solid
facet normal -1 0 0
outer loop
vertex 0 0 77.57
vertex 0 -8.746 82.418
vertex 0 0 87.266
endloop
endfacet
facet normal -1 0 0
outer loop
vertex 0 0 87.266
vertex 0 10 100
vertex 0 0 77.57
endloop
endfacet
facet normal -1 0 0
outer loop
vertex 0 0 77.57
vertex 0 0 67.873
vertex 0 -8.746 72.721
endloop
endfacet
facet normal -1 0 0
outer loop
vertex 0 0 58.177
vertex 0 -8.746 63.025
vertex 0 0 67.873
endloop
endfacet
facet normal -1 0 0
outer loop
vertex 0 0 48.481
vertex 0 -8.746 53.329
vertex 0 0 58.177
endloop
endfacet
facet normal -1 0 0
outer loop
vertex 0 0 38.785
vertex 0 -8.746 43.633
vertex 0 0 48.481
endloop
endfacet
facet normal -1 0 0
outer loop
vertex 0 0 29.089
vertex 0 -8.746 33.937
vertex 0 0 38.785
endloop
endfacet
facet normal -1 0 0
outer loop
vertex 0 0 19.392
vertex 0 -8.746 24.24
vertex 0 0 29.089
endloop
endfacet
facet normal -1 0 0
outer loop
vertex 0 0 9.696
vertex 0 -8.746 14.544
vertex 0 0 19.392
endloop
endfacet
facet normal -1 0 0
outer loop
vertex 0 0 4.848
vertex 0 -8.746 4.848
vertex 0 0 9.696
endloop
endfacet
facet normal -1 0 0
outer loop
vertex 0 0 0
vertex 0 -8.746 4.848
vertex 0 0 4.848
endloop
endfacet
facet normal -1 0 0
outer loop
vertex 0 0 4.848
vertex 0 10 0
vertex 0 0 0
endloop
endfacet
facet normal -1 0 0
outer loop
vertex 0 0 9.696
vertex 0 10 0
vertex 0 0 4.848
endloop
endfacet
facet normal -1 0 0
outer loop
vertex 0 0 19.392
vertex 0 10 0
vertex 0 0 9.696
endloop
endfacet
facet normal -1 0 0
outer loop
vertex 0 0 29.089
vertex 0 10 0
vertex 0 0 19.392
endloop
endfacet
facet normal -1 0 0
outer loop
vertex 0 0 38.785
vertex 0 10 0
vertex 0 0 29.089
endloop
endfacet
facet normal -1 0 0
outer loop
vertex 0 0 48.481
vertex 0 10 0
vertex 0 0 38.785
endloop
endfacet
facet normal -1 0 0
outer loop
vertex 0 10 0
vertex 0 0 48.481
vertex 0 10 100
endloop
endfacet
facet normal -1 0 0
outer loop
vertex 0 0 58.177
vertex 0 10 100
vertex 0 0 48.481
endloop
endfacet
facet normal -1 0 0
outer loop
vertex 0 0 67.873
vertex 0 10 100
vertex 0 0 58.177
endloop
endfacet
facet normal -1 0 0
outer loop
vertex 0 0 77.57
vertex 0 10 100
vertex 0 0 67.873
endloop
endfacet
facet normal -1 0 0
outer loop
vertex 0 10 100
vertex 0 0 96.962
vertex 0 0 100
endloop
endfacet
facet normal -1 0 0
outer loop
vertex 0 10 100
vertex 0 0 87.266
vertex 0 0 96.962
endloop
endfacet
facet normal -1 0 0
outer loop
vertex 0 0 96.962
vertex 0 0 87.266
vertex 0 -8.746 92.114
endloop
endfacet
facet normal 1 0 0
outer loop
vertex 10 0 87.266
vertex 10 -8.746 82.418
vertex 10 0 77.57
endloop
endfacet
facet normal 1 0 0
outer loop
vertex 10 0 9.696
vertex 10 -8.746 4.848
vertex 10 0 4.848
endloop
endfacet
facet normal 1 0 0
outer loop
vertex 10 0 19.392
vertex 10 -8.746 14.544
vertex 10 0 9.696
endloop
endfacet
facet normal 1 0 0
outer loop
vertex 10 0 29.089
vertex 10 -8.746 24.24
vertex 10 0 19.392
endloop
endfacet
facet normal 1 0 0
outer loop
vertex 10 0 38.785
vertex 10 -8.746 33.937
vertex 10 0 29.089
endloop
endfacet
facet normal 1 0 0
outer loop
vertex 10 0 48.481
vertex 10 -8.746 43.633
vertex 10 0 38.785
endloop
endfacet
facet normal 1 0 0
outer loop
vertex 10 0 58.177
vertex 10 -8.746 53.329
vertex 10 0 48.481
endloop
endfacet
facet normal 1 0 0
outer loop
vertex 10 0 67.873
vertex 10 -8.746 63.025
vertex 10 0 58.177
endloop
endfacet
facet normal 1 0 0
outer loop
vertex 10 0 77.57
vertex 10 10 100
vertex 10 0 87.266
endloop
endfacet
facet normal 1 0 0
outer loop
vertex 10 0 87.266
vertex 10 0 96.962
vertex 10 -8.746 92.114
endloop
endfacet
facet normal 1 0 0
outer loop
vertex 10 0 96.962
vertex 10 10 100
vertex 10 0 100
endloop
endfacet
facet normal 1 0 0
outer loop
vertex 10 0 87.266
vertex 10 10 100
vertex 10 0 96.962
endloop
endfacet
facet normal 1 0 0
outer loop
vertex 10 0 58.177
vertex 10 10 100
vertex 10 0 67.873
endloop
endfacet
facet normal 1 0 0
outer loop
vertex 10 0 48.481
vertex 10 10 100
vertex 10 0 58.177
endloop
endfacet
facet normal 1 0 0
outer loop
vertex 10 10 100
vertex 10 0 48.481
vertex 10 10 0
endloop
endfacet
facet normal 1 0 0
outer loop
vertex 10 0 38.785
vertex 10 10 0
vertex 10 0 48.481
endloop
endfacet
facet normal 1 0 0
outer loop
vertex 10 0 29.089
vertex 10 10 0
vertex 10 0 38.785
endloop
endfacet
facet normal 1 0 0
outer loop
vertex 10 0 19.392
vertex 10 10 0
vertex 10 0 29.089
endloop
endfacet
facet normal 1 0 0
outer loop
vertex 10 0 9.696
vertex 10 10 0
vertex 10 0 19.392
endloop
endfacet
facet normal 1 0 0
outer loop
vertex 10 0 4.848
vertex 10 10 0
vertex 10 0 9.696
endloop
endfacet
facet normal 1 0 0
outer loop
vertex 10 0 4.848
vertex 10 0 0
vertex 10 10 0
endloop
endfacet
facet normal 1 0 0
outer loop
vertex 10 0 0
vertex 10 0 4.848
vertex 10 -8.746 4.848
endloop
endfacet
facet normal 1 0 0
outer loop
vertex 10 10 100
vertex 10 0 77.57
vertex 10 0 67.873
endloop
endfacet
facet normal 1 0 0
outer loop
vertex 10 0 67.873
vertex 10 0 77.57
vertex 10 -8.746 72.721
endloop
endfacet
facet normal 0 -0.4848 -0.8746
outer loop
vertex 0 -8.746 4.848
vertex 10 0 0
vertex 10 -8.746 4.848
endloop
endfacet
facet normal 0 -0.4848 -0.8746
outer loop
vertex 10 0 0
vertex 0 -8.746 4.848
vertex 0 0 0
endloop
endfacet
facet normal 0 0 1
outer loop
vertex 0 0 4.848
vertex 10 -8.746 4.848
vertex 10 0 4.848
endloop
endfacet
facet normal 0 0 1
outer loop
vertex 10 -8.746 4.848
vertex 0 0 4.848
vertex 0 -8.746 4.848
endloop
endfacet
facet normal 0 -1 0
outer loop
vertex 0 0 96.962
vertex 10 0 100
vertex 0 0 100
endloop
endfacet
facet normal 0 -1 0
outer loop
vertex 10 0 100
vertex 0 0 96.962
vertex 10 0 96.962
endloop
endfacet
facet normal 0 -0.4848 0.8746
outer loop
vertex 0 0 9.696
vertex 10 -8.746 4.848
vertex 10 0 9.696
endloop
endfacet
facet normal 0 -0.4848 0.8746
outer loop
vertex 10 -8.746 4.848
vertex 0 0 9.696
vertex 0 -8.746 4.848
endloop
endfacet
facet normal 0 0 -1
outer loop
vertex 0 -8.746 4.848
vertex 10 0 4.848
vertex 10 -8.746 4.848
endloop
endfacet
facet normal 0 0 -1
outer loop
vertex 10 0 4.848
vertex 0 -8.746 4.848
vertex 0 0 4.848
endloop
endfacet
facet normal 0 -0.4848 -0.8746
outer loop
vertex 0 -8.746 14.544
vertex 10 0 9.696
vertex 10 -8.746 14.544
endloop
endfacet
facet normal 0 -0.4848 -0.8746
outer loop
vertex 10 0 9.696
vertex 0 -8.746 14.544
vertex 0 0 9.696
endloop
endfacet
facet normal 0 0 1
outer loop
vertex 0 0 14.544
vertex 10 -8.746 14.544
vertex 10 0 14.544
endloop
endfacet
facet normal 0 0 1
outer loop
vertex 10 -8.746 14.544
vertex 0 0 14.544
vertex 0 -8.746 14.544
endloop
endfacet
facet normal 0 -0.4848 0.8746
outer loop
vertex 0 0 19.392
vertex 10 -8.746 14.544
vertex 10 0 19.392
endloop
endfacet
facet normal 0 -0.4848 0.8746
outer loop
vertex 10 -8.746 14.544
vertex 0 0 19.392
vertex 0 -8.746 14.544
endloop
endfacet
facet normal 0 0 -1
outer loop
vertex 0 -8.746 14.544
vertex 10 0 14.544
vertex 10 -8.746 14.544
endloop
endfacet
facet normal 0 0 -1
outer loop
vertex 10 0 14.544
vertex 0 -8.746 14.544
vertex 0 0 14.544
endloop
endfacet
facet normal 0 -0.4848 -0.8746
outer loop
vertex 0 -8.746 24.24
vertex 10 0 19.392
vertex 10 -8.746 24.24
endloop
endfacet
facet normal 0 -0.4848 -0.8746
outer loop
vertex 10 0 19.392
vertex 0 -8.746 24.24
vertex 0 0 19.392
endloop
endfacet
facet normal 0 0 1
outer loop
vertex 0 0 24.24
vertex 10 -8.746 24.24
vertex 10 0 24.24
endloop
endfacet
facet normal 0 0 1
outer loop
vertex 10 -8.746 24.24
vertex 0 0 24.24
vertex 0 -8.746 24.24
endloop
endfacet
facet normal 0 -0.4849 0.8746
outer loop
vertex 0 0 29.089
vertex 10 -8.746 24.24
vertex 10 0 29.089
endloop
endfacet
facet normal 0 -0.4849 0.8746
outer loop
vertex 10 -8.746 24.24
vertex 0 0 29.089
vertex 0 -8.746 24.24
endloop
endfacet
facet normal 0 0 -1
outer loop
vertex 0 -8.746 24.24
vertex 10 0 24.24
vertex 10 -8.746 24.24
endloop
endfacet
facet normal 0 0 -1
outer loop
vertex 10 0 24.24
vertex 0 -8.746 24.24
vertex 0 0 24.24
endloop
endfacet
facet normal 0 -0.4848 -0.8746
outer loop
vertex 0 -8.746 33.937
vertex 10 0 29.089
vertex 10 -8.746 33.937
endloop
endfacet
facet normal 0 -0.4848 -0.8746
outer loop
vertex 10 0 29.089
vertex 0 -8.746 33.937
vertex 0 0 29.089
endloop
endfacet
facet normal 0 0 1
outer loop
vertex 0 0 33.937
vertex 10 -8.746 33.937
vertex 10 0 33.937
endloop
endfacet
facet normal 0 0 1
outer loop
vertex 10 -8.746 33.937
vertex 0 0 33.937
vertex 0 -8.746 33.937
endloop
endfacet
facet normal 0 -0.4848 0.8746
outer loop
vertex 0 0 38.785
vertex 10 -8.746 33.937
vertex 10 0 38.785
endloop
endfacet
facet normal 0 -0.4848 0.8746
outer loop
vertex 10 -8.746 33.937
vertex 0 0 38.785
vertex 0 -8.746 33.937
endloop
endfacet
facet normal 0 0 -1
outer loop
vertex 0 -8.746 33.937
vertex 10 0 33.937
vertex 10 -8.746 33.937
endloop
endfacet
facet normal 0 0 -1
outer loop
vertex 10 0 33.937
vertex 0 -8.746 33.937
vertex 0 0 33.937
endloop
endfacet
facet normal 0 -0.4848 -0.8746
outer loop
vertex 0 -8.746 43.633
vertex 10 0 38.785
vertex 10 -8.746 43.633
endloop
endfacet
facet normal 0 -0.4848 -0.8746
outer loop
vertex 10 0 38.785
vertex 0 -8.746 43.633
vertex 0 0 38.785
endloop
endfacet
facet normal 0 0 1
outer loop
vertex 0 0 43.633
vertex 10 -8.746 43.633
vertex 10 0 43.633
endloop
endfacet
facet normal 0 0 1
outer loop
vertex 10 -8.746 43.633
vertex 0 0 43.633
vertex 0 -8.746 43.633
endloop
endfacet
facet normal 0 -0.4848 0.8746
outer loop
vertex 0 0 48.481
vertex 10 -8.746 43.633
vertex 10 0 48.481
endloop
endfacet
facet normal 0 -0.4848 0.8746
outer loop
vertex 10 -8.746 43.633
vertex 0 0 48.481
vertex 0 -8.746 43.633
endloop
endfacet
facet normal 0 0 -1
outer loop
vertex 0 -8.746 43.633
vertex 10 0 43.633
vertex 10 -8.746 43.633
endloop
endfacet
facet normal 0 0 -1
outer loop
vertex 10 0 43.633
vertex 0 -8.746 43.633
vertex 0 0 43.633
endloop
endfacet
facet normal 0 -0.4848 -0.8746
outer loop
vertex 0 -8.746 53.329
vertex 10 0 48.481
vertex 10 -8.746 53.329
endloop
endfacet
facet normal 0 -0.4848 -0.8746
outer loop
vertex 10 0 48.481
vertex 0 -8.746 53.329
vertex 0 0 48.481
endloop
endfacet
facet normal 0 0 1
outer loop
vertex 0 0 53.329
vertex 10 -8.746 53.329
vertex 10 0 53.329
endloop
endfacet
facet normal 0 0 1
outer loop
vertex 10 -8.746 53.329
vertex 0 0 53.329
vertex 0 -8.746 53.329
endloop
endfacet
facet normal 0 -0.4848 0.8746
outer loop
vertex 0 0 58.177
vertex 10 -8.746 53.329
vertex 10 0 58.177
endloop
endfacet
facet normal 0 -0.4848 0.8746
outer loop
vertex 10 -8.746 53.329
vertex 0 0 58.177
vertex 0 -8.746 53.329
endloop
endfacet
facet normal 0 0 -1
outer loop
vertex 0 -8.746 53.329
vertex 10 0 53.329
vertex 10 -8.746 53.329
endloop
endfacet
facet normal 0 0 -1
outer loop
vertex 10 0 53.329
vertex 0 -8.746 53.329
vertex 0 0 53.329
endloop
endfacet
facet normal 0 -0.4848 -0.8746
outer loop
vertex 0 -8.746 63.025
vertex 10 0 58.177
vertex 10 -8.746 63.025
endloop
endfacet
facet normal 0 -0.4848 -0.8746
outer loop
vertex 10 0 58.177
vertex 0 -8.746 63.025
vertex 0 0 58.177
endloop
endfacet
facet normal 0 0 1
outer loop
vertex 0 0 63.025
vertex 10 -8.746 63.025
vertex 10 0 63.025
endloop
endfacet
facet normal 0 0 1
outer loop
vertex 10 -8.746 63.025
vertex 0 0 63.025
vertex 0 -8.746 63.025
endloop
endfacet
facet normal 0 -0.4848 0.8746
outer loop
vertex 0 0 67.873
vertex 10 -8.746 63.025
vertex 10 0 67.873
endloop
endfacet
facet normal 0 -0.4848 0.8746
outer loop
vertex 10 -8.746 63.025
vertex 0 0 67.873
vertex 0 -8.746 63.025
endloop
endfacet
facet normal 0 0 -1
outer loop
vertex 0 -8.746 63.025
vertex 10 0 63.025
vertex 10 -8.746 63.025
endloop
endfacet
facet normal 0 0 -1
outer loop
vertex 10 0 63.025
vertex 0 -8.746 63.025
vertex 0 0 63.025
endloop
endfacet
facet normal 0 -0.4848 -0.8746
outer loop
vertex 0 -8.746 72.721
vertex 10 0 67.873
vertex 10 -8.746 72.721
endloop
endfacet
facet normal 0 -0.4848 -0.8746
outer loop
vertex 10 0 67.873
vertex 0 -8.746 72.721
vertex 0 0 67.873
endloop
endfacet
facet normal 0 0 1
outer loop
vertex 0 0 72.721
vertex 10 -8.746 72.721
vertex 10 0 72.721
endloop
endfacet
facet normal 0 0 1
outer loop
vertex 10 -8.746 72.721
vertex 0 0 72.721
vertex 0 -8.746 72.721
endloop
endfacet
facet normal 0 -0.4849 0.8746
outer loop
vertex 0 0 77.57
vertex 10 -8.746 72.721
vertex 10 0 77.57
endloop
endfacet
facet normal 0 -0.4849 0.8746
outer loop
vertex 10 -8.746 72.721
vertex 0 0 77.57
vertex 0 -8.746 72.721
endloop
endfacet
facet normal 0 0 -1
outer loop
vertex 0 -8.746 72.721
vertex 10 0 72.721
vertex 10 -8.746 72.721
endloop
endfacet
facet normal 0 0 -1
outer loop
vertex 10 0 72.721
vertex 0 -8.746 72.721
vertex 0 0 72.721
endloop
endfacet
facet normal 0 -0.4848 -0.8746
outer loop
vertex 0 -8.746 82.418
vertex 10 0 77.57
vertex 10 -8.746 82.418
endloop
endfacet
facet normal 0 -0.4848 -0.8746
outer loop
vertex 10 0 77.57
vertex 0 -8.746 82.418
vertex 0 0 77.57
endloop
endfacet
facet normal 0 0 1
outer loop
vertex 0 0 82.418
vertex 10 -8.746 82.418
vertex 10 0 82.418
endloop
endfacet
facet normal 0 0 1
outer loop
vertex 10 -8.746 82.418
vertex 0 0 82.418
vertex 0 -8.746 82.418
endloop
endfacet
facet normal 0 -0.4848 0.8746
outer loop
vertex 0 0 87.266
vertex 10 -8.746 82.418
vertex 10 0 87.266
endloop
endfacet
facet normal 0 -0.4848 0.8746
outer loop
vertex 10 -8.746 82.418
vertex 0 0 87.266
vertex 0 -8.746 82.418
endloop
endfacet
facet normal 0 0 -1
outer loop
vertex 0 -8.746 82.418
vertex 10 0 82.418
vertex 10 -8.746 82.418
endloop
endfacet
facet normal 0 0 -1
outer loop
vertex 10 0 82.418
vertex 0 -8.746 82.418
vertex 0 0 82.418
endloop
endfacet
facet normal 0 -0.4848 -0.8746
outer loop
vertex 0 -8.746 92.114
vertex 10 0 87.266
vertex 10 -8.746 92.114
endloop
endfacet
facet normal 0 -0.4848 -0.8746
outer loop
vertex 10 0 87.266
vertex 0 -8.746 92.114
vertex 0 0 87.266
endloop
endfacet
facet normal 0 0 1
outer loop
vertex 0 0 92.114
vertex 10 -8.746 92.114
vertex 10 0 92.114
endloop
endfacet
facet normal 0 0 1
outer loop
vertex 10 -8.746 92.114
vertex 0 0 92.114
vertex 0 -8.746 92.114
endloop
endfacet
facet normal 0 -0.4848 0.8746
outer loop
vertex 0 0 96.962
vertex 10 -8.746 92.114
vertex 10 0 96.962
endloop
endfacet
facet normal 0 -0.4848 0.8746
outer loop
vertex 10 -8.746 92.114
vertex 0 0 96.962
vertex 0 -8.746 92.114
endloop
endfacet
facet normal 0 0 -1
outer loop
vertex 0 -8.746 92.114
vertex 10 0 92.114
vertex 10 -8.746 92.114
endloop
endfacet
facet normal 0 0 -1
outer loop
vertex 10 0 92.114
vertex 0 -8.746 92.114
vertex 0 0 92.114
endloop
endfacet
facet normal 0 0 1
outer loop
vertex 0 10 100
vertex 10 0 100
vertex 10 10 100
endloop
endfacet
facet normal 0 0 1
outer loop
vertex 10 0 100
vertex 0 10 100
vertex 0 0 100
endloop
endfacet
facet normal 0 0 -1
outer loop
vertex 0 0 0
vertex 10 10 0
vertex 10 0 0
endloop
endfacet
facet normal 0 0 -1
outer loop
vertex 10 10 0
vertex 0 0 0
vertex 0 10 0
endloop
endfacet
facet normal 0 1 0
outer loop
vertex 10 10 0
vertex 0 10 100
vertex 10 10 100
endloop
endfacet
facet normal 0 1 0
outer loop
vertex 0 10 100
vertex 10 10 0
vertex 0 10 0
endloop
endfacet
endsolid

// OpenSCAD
height = 100;
width = 10;
//tooth_height = 5;
/*
tooth_angle = 90 - 61;
tooth_height = tan(tooth_angle) * cos(tooth_angle) * width * 2;

cube([width, width, height]);
for(z = [0:tooth_height:height - tooth_height]) {
	translate([0, 0, z]) {
		scale([1, 1, tooth_height / width / sqrt(2)]) {
			rotate([45, 0, 0]) {
				cube([width, width, width]);
			}
		}
	}
}*/

cube([width, width, height]);
angle = 90 - 61;
tooth_height = 2 * tan(angle) * cos(angle) * width;
for(z = [0:tooth_height:height - tooth_height]) {
	translate([0, 0, z]) {
		tooth(angle);
	}
}

module tooth(angle) {
	half_tooth(angle);
	translate([0, 0, 2 * tan(angle) * cos(angle) * width])
		scale([1, 1, -1])
			half_tooth(angle);
}

module half_tooth(angle) {
	difference() {
		rotate([90 - angle, 0, 0]) {
			cube([width, width, width]);
		}
		translate([0, -width, tan(angle) * cos(angle) * width]) {
			cube([width, width * 2, width * 2]);
		}
		cube([width, width, width * 2]);
	}
}
